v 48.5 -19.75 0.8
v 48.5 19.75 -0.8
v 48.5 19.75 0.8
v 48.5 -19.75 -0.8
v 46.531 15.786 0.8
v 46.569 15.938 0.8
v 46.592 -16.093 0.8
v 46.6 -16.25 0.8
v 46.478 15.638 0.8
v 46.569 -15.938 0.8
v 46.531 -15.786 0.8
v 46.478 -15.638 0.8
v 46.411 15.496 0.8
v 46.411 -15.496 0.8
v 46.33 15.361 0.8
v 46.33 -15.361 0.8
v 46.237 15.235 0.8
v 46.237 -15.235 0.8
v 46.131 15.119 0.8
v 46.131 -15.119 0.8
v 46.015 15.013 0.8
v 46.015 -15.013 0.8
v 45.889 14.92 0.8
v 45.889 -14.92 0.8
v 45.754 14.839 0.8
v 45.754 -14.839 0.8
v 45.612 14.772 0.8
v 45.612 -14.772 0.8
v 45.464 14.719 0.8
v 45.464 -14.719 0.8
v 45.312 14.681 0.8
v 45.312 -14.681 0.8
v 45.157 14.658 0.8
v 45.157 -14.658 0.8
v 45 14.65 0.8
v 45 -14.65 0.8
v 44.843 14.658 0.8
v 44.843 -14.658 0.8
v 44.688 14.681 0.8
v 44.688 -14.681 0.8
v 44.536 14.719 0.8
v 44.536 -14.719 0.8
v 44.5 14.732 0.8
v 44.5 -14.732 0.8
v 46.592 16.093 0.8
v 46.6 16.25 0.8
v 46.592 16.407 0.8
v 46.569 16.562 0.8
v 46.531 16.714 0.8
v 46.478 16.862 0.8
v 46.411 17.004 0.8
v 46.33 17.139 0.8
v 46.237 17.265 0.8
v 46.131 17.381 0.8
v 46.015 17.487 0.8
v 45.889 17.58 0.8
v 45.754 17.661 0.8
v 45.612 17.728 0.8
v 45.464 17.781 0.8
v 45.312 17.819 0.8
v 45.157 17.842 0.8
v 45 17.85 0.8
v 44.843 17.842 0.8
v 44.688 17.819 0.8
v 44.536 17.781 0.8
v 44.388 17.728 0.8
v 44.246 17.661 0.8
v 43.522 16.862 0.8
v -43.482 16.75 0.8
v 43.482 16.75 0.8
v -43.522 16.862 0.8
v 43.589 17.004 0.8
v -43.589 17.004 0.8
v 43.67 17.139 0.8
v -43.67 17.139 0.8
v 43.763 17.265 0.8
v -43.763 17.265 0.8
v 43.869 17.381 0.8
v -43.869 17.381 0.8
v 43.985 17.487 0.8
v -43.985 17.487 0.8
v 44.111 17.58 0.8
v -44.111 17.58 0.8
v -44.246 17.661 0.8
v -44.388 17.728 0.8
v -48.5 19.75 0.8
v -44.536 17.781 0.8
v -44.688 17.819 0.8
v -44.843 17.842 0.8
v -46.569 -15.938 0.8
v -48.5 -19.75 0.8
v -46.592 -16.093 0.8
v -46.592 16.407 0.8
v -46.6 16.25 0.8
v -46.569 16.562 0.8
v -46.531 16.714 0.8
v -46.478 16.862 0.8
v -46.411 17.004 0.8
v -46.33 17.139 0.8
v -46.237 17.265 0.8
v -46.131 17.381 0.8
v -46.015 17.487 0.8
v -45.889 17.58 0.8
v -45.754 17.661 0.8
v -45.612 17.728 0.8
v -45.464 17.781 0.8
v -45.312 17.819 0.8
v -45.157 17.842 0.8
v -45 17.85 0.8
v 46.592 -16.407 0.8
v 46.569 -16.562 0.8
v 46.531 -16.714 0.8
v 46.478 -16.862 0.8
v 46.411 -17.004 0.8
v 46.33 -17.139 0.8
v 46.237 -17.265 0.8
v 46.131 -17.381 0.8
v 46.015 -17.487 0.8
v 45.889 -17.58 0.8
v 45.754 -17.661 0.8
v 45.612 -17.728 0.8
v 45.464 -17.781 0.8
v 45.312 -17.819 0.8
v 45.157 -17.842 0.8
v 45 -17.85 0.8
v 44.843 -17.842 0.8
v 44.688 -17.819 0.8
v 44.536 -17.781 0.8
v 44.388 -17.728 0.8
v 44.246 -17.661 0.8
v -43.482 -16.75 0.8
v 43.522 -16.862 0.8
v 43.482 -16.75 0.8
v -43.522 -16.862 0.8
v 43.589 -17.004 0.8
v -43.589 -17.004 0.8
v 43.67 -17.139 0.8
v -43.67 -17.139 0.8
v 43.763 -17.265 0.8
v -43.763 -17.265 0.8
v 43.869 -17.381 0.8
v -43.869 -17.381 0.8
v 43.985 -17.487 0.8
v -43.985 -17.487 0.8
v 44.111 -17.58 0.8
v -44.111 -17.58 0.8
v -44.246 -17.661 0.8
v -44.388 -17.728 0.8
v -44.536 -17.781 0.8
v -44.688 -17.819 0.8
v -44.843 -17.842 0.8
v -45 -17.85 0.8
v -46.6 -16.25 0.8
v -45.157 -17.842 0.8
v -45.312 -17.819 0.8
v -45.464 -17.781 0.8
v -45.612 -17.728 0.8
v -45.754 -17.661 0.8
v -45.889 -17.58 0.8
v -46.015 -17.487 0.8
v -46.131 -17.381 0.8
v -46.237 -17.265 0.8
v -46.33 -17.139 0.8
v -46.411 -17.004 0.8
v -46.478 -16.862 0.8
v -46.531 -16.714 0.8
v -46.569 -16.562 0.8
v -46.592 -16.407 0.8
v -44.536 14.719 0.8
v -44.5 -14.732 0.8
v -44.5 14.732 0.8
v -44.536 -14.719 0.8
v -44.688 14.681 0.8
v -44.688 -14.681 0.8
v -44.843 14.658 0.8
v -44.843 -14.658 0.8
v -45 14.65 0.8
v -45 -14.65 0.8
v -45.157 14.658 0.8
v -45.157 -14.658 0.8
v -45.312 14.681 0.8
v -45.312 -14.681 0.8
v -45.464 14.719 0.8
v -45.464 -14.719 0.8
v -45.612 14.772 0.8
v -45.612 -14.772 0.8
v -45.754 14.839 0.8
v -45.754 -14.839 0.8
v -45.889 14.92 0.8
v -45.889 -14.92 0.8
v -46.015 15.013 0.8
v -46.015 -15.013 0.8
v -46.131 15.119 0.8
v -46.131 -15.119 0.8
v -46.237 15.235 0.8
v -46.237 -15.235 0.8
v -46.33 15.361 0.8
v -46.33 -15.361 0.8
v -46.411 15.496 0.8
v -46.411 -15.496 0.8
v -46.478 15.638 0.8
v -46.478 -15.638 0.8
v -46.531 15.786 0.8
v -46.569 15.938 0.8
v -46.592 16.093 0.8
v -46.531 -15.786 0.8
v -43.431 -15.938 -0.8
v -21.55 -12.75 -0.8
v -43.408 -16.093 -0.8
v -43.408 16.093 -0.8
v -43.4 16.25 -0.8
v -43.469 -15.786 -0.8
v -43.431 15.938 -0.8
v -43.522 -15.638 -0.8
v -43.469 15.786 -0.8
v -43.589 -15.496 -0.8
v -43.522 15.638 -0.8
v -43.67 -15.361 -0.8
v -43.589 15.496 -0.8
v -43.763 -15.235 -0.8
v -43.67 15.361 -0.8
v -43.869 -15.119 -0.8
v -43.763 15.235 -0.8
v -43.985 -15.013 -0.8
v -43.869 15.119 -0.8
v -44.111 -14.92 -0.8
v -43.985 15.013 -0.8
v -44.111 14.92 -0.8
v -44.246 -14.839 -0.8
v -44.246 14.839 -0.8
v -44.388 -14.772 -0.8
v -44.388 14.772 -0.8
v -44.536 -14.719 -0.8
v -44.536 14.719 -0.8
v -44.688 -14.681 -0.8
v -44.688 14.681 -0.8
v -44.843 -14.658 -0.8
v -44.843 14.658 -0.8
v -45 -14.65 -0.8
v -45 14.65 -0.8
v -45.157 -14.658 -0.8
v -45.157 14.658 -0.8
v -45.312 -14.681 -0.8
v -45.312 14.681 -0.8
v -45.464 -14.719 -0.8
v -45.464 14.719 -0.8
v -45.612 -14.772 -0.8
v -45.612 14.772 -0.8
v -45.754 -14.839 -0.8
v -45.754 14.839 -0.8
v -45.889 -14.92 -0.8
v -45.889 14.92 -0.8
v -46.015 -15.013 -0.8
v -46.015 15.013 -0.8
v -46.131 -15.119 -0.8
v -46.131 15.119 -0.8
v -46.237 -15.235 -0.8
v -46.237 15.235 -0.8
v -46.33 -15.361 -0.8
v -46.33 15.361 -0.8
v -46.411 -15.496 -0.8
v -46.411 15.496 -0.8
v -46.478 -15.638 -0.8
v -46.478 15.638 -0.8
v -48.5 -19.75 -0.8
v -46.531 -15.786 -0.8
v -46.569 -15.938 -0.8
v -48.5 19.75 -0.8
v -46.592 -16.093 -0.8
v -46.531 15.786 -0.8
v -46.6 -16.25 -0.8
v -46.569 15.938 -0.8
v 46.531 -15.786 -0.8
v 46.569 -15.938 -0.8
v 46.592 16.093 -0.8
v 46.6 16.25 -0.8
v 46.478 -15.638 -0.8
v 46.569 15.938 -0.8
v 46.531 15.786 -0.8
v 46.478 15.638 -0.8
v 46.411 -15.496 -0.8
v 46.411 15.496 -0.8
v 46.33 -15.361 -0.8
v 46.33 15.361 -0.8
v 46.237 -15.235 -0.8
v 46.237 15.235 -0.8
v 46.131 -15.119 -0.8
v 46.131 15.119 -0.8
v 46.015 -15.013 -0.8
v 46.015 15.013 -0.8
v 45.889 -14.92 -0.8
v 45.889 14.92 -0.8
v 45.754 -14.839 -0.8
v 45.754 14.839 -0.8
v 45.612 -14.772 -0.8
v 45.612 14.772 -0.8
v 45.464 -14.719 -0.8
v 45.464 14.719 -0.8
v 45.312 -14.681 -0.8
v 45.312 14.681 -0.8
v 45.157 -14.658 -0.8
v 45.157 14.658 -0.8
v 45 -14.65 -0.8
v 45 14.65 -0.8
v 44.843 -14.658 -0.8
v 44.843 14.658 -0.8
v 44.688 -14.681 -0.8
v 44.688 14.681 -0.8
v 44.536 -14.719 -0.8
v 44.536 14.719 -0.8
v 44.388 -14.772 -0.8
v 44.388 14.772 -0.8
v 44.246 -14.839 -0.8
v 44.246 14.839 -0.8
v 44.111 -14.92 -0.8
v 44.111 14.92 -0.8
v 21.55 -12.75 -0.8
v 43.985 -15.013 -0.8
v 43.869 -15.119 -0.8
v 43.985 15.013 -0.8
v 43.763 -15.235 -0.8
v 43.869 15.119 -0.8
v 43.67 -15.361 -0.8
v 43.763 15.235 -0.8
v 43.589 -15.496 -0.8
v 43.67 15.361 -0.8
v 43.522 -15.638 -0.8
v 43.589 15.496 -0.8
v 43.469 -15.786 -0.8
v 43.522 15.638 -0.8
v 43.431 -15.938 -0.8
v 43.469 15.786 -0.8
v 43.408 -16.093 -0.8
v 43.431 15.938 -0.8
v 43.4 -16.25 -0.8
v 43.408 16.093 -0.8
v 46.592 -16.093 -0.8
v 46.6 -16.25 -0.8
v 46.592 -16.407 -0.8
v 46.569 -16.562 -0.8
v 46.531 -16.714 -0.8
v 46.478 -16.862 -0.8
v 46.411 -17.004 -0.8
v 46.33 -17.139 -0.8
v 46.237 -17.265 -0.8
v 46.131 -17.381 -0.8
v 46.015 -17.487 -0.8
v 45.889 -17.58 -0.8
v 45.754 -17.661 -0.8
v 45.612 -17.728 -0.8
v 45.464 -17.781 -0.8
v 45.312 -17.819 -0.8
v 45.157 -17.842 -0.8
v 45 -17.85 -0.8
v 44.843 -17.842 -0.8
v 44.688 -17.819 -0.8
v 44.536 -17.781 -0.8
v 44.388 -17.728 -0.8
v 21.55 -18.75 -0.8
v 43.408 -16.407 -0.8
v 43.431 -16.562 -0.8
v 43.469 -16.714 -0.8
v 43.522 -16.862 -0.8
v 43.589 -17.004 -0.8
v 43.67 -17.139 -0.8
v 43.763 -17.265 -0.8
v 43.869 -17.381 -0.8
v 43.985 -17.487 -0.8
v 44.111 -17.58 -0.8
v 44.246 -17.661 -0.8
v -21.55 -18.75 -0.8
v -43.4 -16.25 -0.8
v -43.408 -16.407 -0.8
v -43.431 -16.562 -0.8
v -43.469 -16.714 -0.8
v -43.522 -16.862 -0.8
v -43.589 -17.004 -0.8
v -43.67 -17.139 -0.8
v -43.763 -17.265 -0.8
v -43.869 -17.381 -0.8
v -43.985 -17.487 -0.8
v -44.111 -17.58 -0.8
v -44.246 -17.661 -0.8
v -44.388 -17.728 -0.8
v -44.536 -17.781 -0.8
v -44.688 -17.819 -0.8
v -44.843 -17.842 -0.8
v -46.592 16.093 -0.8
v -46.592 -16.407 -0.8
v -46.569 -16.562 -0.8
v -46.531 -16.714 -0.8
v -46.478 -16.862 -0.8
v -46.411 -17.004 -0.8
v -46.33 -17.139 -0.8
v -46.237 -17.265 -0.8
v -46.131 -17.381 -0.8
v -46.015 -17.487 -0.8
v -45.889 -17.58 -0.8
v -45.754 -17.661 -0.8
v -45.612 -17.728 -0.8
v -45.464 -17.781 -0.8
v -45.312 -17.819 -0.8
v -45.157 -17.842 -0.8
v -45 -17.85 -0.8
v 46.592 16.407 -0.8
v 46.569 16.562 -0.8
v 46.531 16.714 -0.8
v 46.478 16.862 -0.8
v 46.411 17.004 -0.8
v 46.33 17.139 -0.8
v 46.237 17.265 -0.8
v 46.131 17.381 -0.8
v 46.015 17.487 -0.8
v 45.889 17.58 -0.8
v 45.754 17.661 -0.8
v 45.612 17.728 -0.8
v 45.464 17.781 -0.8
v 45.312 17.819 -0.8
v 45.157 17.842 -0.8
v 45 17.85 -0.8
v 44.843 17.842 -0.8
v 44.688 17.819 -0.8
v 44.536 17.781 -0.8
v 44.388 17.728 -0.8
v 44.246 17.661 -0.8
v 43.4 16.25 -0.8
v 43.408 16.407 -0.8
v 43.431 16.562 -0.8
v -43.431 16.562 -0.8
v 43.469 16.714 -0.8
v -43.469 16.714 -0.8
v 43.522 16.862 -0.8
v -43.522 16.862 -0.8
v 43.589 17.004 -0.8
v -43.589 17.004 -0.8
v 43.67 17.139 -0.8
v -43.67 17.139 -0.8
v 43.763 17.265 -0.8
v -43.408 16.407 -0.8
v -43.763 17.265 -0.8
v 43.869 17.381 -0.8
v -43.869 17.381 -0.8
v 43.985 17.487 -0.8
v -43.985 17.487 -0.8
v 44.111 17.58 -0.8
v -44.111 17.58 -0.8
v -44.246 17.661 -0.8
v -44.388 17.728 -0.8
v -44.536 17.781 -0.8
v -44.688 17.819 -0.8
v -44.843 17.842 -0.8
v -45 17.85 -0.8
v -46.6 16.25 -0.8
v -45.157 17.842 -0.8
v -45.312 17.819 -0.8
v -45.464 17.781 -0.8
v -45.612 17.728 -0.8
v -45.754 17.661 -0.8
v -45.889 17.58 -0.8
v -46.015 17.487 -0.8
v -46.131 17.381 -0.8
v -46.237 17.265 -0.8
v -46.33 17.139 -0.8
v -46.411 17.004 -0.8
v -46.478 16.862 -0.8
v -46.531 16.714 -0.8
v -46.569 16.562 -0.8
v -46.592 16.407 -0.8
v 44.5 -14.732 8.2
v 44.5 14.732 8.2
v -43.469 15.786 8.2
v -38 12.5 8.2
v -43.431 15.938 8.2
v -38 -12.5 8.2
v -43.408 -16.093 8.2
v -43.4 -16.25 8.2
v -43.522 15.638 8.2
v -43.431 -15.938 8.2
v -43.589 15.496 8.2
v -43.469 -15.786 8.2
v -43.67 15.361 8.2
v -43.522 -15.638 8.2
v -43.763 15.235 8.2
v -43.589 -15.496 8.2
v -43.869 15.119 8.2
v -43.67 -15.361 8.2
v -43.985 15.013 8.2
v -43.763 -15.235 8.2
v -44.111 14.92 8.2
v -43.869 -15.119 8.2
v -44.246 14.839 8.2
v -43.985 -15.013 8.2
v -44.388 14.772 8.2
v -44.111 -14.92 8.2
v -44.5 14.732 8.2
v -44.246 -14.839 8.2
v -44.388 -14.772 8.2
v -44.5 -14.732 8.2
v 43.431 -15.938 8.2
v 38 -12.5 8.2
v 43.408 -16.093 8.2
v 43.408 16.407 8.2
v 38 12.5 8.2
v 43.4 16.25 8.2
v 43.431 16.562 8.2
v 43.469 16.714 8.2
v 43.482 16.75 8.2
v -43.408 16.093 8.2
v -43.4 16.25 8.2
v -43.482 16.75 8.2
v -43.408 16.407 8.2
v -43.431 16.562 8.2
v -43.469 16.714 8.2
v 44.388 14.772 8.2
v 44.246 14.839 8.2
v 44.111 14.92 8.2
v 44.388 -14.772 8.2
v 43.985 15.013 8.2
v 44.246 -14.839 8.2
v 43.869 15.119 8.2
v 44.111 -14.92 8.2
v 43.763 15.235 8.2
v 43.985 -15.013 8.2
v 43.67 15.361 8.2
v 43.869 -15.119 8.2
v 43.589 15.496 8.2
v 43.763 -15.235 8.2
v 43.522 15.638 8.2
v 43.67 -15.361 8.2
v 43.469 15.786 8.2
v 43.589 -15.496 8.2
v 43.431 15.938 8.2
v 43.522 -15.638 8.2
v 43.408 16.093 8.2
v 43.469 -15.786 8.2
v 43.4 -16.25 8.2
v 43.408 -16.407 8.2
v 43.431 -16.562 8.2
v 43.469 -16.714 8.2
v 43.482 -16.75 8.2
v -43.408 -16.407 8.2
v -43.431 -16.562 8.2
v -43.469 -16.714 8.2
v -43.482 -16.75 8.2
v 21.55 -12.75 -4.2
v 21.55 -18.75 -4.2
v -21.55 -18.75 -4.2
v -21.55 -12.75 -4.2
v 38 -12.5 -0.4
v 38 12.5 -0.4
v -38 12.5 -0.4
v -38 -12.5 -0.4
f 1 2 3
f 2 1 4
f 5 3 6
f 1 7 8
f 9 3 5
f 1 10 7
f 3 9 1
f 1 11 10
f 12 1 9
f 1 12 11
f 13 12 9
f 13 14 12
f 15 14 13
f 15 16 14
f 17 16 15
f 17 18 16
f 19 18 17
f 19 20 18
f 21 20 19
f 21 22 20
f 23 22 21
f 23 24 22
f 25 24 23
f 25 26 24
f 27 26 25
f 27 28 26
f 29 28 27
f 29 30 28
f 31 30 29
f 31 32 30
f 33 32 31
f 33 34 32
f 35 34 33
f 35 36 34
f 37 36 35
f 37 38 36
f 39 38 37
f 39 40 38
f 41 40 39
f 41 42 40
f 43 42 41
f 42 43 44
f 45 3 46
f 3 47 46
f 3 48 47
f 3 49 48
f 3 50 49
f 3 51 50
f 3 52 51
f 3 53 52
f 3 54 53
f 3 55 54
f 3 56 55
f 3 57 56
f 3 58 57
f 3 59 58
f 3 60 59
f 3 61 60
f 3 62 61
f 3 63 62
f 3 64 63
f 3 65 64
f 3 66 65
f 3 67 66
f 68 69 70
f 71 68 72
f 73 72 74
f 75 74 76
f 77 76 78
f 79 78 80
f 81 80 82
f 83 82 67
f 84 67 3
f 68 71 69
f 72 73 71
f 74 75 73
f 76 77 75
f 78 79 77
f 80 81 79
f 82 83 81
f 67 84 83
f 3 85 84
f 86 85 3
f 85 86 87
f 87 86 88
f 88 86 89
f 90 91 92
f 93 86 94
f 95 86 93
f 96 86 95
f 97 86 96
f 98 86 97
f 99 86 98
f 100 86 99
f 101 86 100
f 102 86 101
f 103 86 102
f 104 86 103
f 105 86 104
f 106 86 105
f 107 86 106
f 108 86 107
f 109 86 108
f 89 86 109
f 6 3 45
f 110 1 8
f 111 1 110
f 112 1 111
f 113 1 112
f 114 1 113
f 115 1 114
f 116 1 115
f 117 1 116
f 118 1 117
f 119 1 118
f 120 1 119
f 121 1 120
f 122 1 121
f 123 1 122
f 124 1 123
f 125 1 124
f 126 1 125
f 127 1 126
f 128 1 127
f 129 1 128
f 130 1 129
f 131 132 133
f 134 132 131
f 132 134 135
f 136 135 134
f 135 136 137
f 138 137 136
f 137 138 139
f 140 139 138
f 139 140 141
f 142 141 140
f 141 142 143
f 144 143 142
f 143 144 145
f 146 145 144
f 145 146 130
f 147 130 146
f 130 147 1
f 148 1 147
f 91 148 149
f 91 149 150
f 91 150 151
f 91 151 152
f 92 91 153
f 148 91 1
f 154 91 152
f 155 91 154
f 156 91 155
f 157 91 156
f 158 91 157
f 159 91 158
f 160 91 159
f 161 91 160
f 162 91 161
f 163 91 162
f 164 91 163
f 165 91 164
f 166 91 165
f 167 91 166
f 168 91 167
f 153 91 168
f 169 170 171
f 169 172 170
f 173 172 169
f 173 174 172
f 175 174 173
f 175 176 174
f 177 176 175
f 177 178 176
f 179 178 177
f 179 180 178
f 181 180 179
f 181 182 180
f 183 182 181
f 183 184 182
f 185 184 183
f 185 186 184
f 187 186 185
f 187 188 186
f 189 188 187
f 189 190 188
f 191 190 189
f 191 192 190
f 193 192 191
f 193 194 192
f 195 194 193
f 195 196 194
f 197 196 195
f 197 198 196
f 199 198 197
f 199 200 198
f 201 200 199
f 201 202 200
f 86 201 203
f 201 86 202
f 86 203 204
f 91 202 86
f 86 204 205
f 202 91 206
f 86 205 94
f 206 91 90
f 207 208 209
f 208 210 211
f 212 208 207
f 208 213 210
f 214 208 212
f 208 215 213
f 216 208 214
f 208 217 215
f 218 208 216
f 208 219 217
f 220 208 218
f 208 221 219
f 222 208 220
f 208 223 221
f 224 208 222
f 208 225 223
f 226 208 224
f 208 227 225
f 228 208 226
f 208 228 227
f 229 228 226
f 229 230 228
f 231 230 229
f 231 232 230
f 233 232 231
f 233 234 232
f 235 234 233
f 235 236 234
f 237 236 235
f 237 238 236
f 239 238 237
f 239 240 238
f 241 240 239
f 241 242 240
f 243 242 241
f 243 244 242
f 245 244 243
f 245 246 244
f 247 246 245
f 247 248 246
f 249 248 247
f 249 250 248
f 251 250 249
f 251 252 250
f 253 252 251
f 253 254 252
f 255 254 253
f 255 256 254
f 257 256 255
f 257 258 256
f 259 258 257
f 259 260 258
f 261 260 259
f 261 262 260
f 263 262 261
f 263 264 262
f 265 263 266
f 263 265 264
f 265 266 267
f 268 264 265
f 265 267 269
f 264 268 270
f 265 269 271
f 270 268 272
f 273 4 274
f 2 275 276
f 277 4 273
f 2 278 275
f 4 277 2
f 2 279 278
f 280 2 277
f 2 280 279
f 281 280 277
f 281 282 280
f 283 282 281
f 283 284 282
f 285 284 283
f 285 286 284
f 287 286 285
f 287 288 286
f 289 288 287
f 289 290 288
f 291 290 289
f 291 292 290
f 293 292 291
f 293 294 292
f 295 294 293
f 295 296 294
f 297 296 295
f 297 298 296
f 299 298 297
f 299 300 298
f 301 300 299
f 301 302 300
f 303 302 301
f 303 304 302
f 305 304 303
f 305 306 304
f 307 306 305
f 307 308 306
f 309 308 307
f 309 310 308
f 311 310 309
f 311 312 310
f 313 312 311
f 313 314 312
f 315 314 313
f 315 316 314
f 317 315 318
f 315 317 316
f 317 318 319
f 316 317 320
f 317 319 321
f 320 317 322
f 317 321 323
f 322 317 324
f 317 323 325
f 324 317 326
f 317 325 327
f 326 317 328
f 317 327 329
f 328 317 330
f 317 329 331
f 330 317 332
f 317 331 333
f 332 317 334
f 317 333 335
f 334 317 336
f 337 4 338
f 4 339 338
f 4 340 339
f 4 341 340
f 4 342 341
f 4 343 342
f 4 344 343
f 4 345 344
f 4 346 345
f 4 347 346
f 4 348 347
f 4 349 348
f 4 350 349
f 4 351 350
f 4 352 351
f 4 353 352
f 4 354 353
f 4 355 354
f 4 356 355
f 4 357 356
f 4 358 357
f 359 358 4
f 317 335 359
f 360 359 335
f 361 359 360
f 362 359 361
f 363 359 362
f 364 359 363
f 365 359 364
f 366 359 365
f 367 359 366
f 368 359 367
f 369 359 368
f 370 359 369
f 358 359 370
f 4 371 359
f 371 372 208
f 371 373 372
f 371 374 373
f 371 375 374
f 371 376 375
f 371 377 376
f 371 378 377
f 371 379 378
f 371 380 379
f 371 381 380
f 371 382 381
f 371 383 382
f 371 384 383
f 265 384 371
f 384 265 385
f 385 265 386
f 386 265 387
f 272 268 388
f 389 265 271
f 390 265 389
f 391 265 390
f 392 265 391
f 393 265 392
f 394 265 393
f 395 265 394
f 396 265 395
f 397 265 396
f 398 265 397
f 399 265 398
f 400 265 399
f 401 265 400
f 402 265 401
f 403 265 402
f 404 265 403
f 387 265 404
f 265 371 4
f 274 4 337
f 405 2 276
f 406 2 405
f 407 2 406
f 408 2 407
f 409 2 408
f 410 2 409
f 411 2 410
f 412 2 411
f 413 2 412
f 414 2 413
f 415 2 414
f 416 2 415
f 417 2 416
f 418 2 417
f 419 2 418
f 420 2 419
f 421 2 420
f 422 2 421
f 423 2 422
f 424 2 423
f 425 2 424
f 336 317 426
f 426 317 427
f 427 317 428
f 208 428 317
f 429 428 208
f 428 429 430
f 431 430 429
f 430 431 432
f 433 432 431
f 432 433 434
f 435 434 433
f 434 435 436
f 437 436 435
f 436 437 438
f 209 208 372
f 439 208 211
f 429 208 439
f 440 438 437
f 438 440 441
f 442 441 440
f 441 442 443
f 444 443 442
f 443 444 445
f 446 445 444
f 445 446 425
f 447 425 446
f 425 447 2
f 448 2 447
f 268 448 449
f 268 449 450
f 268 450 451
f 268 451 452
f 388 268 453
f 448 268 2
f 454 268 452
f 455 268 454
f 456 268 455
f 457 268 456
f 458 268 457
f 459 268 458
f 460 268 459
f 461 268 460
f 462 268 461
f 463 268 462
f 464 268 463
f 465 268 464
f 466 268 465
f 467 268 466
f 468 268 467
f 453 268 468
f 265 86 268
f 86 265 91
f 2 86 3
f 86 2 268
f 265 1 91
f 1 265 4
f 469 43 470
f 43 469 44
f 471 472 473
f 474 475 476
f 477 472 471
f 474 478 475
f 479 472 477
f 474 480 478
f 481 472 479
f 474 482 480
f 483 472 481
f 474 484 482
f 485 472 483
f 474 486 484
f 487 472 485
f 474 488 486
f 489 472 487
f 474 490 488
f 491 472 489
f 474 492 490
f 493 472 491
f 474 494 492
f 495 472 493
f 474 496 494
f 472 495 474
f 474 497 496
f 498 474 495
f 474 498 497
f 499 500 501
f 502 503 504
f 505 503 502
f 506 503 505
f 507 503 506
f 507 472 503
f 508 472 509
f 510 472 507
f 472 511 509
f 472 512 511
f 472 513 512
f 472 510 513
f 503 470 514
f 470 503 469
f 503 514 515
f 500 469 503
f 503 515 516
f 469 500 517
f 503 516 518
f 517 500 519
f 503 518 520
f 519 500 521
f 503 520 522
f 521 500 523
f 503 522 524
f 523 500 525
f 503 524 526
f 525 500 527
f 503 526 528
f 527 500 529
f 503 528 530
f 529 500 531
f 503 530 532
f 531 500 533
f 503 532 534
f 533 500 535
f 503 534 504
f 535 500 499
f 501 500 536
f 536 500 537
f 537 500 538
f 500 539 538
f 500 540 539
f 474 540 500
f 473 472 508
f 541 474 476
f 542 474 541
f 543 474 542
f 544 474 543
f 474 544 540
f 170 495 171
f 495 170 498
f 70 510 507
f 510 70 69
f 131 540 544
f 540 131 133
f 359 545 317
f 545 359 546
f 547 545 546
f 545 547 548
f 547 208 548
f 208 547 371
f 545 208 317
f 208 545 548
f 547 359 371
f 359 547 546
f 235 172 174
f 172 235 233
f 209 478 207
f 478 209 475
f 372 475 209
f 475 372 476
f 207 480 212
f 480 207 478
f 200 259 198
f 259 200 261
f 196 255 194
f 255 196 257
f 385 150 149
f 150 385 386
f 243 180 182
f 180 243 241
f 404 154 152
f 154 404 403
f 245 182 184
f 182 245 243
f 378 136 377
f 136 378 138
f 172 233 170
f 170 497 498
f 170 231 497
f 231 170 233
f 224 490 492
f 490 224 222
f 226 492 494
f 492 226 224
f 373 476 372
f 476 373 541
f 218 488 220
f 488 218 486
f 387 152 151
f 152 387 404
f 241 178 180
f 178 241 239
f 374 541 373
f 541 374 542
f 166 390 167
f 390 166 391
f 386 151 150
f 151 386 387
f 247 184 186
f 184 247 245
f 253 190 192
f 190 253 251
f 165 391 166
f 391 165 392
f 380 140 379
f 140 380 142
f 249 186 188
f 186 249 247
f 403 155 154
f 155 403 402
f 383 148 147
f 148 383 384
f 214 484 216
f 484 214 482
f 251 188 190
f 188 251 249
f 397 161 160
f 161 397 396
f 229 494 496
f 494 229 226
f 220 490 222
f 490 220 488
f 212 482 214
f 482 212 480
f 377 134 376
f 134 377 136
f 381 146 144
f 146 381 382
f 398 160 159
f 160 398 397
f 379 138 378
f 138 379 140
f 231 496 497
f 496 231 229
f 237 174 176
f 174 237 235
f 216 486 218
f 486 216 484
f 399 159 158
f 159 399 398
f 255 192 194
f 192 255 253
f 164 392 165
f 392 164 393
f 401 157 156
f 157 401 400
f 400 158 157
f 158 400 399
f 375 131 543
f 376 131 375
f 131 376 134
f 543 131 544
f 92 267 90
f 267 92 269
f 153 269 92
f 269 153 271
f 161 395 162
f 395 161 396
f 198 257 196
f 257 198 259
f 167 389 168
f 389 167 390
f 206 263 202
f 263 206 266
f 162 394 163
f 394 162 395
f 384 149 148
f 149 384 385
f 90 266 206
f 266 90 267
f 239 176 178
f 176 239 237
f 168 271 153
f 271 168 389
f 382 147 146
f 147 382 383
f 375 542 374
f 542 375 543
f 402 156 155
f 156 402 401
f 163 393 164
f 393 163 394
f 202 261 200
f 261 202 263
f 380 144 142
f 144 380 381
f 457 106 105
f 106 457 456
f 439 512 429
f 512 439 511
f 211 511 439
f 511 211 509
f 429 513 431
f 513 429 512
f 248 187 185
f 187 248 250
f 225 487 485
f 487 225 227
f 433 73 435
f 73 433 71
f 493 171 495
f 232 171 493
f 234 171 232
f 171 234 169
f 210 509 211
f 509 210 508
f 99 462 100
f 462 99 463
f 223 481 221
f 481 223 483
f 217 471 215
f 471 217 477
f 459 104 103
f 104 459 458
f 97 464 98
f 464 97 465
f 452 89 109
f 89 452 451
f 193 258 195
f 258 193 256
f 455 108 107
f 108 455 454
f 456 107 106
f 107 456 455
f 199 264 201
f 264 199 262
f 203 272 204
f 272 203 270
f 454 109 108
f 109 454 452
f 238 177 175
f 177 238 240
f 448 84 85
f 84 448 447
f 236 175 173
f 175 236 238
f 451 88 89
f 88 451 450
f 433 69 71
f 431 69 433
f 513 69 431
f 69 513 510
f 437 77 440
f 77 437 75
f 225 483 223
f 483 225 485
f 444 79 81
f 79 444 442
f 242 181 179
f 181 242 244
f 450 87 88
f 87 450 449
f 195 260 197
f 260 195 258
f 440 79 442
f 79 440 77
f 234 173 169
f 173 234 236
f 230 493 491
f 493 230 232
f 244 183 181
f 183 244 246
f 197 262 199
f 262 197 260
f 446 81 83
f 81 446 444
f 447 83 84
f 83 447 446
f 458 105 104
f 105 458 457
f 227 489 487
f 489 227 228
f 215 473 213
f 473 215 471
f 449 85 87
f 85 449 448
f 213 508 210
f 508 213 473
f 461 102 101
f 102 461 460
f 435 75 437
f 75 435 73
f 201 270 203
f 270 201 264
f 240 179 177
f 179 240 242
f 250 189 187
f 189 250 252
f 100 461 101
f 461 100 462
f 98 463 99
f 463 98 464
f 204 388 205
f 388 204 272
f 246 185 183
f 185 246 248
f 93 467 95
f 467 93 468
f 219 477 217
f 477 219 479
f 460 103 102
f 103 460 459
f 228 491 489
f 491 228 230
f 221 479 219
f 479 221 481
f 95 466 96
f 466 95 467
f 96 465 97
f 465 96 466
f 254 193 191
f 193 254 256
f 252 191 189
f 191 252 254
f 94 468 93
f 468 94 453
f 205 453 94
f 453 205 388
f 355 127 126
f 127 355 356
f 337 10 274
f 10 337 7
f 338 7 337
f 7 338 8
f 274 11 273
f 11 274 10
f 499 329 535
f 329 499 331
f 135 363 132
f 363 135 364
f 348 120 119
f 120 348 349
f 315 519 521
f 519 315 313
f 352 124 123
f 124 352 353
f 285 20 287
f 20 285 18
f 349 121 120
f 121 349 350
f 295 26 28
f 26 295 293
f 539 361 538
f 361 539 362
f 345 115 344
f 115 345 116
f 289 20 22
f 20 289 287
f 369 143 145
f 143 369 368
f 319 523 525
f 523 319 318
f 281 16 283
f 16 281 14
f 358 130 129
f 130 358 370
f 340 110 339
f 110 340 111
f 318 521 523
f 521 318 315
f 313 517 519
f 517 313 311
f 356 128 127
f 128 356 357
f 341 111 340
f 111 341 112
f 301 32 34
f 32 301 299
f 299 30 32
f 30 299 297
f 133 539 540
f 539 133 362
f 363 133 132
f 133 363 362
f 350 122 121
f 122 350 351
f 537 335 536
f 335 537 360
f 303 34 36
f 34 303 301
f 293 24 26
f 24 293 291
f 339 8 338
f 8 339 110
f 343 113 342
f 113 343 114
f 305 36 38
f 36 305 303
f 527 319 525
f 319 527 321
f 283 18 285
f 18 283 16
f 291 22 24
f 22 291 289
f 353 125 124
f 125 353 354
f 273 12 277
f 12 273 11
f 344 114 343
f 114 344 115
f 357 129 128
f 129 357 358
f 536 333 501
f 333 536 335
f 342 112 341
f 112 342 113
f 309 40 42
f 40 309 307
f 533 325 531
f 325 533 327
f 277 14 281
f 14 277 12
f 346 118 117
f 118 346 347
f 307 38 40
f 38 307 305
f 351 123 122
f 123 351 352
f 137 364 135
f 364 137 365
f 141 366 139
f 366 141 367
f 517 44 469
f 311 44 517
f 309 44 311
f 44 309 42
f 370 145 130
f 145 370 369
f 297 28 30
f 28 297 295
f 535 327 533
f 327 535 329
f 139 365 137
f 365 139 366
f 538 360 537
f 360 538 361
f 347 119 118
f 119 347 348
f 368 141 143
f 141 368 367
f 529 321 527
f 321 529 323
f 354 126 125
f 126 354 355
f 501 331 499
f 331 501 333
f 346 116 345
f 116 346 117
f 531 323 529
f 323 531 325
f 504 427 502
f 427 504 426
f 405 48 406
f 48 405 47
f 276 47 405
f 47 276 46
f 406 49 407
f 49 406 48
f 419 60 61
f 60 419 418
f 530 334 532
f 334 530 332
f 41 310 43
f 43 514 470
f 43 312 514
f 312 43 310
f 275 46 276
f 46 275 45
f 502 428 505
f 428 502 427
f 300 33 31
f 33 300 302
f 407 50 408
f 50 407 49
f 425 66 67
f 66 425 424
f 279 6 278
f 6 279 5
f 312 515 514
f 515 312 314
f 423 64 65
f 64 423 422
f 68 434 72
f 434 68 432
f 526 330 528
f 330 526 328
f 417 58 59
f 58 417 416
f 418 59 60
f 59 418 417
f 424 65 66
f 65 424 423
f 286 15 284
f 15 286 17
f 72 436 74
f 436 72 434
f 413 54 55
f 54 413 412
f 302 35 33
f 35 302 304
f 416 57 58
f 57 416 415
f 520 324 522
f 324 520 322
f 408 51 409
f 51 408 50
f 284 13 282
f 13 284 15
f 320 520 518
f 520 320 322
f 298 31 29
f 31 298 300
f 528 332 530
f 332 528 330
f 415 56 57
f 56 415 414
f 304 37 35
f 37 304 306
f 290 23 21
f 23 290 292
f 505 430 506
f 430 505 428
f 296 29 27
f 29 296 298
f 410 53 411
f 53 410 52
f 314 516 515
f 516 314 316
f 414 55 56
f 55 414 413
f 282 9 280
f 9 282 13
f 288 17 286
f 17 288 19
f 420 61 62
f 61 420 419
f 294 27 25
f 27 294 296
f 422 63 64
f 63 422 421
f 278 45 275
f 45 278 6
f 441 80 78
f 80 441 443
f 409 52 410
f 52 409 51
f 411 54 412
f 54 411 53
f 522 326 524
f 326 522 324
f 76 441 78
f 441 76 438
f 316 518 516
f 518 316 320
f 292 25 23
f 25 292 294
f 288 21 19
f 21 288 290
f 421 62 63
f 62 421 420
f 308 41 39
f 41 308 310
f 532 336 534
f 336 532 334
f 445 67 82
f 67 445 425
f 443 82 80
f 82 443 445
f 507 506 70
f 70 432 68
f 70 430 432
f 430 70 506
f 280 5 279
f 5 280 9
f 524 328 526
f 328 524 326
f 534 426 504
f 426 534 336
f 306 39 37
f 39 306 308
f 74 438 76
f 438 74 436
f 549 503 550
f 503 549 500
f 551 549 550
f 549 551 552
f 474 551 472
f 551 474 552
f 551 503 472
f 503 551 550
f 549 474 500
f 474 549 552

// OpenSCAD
// LCD2004A (2004A) display module - 97.0mm x 39.5mm
// One connected solid, with bezel/aperture, 4 mounting holes, and 16-pin header block.

$fn = 64;

// Parameters (overall)
width_mm  = 97.0;   // X
height_mm = 39.5;   // Y

// PCB
pcb_thickness_mm = 1.6;

// Bezel / display body
body_margin_x_mm = 4.0;
body_margin_y_mm = 3.0;
display_body_thickness_mm = 8.0;

// Viewing aperture (cut into bezel)
aperture_width_mm  = 76.0;
aperture_height_mm = 25.0;
aperture_offset_x_mm = 0.0;
aperture_offset_y_mm = 0.0;

// Mounting holes
mount_hole_diameter_mm = 3.2;
mount_hole_edge_margin_x_mm = 3.5;
mount_hole_edge_margin_y_mm = 3.5;

// 16-pin header area (typical LCD2004A: 1x16, 2.54mm pitch)
pin_count = 16;
pin_pitch_mm = 2.54;
header_body_w_mm = pin_pitch_mm * (pin_count - 1) + 5.0; // plastic body length
header_body_d_mm = 6.0;   // depth (Y)
header_body_h_mm = 4.0;   // height (Z)
header_offset_y_from_edge_mm = 4.0; // from PCB bottom edge to header center

// Small overlap to guarantee connectivity / avoid coplanar artifacts
overlap_mm = 0.6;

// Derived sizes
bezel_w = width_mm  - 2*body_margin_x_mm;
bezel_h = height_mm - 2*body_margin_y_mm;

// Z placement (PCB centered at Z=0)
pcb_z = 0;
bezel_z = pcb_thickness_mm/2 + display_body_thickness_mm/2 - overlap_mm;

// Header placement (on back side of PCB)
header_z = -pcb_thickness_mm/2 - header_body_h_mm/2 + overlap_mm;

// Mount hole positions
hole_x = width_mm/2  - mount_hole_edge_margin_x_mm;
hole_y = height_mm/2 - mount_hole_edge_margin_y_mm;

// Header position (near bottom edge, centered in X)
header_y = -height_mm/2 + header_offset_y_from_edge_mm;

// Main solid
module lcd2004a_solid() {
    difference() {
        union() {
            // PCB
            cube([width_mm, height_mm, pcb_thickness_mm], center=true);

            // Bezel / display body (connected to PCB with overlap)
            translate([0, 0, bezel_z])
                cube([bezel_w, bezel_h, display_body_thickness_mm], center=true);

            // 16-pin header plastic body (connected to PCB underside with overlap)
            translate([0, header_y, header_z])
                cube([header_body_w_mm, header_body_d_mm, header_body_h_mm], center=true);
        }

        // Viewing aperture cutout (through bezel only; does not remove PCB)
        translate([aperture_offset_x_mm, aperture_offset_y_mm, bezel_z])
            cube([aperture_width_mm, aperture_height_mm, display_body_thickness_mm + 2*overlap_mm], center=true);

        // Mounting holes (through PCB + bezel stack)
        for (sx = [-1, 1], sy = [-1, 1]) {
            translate([sx*hole_x, sy*hole_y, bezel_z])
                cylinder(h = pcb_thickness_mm + display_body_thickness_mm + 4*overlap_mm,
                         r = mount_hole_diameter_mm/2,
                         center = true);
        }
    }
}

lcd2004a_solid();
